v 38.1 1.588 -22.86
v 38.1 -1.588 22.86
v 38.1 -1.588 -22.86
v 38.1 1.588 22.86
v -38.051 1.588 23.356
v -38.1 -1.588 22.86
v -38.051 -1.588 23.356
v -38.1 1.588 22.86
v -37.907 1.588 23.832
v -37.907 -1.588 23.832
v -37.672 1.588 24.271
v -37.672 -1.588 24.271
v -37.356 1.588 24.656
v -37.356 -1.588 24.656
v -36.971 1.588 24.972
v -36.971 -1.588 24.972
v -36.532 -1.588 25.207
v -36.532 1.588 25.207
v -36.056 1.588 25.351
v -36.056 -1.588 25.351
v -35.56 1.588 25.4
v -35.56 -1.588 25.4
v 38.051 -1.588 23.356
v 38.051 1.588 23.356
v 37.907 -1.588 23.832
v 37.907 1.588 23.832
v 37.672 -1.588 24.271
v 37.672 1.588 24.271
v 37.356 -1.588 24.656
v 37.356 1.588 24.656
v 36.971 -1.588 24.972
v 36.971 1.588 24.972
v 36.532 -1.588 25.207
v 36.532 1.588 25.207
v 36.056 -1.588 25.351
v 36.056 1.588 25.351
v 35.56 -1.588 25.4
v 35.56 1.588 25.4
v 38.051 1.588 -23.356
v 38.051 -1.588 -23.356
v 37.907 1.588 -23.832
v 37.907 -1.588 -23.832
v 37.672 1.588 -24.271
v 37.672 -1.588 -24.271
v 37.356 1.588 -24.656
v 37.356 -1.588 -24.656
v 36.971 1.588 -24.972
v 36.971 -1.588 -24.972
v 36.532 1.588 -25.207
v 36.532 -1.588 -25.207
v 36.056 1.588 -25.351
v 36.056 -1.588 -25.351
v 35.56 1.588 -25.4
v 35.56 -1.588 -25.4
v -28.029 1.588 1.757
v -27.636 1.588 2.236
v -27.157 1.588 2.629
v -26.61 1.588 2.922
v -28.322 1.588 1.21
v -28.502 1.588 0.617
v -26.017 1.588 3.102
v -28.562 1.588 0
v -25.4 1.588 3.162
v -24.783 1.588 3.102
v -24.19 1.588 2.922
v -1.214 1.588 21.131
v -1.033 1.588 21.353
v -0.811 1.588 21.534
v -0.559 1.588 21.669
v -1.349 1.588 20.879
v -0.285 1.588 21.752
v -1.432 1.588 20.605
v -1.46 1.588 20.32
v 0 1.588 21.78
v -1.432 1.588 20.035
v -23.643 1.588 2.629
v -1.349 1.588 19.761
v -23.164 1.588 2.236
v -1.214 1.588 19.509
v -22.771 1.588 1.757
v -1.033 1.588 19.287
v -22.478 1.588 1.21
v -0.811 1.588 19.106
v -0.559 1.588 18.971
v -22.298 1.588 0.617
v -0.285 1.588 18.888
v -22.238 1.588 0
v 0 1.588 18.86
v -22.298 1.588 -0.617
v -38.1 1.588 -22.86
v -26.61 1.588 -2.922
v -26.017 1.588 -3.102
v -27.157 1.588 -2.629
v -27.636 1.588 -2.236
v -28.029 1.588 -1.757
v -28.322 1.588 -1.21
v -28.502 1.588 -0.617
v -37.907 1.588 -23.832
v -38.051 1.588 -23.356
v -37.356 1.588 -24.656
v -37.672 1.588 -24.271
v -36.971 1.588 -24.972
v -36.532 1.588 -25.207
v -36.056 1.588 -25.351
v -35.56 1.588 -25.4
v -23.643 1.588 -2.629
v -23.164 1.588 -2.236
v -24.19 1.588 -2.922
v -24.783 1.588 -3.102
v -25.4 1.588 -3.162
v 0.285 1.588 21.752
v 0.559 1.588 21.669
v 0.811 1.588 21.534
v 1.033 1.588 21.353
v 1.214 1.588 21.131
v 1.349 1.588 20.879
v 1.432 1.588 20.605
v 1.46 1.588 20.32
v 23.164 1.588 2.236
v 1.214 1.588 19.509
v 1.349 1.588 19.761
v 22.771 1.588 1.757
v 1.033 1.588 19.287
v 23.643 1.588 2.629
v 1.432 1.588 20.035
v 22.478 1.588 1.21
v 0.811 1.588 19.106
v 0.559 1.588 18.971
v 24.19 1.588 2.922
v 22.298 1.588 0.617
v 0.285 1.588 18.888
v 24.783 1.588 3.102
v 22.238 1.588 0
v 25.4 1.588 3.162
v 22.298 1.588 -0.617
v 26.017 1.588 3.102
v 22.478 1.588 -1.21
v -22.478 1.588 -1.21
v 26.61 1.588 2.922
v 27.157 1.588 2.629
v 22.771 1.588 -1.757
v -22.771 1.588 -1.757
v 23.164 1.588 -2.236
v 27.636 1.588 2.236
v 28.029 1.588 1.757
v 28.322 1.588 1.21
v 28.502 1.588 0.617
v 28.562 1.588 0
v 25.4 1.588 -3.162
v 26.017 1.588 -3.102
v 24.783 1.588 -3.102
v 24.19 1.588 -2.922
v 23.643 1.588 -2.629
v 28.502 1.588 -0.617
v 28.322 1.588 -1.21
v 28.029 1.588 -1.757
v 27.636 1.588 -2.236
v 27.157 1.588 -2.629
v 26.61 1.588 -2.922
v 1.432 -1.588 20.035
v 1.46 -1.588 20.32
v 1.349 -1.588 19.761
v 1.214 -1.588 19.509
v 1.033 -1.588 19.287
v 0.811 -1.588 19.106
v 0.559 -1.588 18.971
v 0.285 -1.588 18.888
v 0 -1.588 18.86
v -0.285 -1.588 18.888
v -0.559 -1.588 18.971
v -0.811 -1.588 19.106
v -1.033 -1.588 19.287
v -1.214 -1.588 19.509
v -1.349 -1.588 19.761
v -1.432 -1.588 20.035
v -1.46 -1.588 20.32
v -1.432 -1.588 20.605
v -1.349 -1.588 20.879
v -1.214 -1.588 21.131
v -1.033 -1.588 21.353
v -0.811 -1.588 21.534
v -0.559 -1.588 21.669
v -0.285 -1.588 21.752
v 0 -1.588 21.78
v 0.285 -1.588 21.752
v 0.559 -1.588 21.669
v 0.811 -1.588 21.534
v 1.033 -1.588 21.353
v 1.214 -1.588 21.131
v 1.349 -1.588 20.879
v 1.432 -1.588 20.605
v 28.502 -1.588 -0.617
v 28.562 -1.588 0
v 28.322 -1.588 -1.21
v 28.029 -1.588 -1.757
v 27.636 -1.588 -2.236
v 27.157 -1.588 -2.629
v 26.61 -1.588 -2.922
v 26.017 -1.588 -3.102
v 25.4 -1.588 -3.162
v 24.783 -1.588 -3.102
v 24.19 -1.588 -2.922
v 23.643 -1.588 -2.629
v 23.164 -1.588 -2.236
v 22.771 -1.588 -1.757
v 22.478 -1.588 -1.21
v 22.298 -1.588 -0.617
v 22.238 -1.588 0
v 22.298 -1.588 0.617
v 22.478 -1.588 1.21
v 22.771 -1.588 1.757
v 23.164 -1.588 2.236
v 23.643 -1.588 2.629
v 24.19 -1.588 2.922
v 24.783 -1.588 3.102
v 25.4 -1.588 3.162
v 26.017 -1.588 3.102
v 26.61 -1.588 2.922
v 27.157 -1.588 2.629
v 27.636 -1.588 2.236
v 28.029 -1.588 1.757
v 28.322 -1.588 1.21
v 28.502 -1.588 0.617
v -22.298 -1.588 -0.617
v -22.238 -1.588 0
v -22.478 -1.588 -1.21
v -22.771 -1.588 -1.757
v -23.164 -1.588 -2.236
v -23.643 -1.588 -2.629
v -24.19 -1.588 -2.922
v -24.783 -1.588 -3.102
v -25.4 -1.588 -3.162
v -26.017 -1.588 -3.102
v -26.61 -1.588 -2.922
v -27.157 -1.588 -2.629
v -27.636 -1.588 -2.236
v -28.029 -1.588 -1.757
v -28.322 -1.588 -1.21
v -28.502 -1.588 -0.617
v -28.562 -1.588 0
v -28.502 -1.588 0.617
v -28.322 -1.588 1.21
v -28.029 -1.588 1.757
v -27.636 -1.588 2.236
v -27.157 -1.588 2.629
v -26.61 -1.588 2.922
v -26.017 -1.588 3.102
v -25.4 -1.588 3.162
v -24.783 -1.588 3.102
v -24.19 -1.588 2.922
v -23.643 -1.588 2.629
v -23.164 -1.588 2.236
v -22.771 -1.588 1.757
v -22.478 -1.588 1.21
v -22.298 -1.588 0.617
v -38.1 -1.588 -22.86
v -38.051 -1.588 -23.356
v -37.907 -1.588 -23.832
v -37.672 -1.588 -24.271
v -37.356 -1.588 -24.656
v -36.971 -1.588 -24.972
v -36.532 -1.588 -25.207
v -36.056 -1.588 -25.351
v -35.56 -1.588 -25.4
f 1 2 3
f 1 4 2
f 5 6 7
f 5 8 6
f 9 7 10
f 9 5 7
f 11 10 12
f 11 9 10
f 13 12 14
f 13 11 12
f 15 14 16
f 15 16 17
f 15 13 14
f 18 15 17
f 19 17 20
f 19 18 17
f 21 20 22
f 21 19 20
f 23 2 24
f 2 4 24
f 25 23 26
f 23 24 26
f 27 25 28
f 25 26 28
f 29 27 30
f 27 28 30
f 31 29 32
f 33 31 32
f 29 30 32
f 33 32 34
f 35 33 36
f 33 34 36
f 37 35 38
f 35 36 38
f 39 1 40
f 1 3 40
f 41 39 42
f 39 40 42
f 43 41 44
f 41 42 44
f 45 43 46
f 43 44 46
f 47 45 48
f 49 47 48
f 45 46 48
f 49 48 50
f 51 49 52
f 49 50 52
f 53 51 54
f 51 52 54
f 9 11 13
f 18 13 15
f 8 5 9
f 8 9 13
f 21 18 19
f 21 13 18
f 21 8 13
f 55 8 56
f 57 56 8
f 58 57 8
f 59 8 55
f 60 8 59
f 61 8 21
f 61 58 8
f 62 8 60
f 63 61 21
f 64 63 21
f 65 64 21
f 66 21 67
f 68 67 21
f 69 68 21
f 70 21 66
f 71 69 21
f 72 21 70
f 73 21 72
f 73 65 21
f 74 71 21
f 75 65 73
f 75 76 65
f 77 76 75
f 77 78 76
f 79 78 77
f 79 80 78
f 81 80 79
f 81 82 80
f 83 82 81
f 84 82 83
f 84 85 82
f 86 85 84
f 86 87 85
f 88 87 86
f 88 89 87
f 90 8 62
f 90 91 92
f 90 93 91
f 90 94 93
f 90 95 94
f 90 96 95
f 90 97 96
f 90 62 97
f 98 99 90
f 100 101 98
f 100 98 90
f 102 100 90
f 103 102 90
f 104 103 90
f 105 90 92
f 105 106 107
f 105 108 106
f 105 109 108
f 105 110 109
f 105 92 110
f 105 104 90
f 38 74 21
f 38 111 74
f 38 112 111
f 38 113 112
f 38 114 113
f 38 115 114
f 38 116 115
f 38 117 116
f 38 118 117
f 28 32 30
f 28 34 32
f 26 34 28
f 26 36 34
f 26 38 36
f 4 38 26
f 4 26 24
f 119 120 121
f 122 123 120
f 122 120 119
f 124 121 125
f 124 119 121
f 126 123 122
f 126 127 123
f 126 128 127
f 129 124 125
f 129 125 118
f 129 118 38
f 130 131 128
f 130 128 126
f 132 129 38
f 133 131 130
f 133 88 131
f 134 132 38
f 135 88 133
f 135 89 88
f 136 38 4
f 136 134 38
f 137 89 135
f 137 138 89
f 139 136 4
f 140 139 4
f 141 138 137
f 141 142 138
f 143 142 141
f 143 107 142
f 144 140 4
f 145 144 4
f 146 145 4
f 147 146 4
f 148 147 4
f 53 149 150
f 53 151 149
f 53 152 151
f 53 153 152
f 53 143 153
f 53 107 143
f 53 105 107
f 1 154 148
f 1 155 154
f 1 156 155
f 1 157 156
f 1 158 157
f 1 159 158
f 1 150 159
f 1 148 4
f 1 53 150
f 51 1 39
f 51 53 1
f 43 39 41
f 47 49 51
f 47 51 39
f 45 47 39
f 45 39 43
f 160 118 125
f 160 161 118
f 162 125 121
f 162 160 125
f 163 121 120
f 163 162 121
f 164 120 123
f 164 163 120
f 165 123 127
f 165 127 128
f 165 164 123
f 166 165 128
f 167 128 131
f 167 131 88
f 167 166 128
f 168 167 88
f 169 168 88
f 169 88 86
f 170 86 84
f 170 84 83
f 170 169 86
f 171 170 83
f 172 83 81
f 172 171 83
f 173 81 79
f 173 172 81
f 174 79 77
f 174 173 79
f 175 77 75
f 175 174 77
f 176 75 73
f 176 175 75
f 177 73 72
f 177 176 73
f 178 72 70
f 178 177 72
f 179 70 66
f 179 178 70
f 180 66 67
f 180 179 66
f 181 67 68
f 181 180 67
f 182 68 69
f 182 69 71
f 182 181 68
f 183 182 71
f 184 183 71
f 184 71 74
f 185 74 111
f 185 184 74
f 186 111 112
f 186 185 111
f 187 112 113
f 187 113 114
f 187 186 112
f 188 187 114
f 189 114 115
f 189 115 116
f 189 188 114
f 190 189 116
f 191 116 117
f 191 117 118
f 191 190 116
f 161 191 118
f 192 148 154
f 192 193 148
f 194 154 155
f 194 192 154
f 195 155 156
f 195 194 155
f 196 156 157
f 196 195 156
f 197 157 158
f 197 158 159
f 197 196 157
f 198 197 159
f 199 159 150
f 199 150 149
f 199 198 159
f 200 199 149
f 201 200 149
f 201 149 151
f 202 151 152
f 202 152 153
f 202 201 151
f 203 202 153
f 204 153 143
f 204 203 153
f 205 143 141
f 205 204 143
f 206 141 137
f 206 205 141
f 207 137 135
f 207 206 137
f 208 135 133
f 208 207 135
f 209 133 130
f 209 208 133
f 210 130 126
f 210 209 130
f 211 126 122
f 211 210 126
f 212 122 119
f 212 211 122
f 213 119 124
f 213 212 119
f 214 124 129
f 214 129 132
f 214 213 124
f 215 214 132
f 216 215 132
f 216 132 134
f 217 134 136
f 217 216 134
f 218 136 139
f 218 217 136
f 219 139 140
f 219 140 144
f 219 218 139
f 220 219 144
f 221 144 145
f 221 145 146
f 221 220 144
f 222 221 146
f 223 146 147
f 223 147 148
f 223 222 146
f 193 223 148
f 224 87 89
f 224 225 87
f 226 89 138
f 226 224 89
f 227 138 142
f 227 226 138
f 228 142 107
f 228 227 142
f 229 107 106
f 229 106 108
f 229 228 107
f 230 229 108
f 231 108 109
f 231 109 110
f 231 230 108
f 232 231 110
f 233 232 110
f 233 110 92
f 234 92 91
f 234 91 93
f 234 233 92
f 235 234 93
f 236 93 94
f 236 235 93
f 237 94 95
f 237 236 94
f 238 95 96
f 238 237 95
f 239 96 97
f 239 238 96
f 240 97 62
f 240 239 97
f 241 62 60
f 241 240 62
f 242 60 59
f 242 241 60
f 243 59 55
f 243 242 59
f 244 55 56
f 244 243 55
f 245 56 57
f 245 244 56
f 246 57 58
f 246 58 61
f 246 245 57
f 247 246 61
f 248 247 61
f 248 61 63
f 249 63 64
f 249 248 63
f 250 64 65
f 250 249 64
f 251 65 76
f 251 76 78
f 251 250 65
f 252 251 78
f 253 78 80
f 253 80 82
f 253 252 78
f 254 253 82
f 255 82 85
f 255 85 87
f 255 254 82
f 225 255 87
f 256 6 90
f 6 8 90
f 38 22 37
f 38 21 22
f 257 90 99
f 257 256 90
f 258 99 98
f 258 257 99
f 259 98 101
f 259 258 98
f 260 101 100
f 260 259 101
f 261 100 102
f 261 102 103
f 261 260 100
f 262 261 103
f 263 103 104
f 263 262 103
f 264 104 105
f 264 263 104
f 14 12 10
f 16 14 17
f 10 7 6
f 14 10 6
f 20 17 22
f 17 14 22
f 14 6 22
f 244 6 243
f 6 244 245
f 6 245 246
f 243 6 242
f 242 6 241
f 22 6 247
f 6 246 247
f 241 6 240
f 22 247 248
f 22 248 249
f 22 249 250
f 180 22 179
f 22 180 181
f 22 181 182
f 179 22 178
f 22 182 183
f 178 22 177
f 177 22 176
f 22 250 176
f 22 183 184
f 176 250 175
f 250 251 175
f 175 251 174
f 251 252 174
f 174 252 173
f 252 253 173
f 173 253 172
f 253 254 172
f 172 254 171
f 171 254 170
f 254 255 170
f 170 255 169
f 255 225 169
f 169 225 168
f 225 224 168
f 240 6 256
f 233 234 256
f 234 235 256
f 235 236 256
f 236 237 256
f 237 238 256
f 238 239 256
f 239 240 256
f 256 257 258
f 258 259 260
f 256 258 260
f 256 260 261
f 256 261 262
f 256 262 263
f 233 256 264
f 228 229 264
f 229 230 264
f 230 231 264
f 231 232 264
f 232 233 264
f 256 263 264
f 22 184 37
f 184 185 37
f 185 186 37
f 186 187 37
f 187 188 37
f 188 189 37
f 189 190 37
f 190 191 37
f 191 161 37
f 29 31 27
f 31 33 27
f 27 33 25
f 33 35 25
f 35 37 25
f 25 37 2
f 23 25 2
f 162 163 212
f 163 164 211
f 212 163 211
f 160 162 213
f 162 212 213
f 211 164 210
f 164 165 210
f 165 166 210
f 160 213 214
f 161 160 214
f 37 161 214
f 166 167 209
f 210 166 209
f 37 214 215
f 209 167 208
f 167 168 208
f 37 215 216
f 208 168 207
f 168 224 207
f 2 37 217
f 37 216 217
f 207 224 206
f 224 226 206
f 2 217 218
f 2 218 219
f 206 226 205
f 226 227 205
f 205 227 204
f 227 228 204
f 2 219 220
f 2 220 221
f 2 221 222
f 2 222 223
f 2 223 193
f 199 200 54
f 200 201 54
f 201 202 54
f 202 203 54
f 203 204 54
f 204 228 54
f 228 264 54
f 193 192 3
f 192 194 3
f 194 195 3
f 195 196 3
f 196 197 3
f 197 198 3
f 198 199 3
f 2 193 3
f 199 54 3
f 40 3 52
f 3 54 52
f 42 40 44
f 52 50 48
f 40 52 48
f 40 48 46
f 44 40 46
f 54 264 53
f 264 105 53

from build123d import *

# Parameters (mm, degrees)
SKETCH1_W           = 76.2
SKETCH1_H           = 50.8
SKETCH1_R           = 3.1623
SKETCH1_R_2         = 1.4605
BOSS_EXTRUDE1_DEPTH = 1.5875
FILLET1_R           = 2.54


with BuildPart() as part:
    # Sketch1 → Boss-Extrude1 (new body, symmetric)
    with BuildSketch(Plane(origin=(0, 0, 0), x_dir=(1, 0, 0), z_dir=(0, 1, 0))):
        Rectangle(SKETCH1_W, SKETCH1_H)
        with Locations((-25.4, 0)):
            Circle(SKETCH1_R, mode=Mode.SUBTRACT)
        with Locations((25.4, 0)):
            Circle(SKETCH1_R, mode=Mode.SUBTRACT)
        with Locations((0, -20.32)):
            Circle(SKETCH1_R_2, mode=Mode.SUBTRACT)
    extrude(amount=BOSS_EXTRUDE1_DEPTH, both=True)

    # Fillet1
    fillet1_edges = [part.edges().sort_by_distance(p)[0] for p in [
        (-38.1, 0, -25.4),
        (38.1, 0, -25.4),
        (38.1, 0, 25.4),
        (-38.1, 0, 25.4),
    ]]
    fillet(fillet1_edges, radius=FILLET1_R)


solid = part.part
